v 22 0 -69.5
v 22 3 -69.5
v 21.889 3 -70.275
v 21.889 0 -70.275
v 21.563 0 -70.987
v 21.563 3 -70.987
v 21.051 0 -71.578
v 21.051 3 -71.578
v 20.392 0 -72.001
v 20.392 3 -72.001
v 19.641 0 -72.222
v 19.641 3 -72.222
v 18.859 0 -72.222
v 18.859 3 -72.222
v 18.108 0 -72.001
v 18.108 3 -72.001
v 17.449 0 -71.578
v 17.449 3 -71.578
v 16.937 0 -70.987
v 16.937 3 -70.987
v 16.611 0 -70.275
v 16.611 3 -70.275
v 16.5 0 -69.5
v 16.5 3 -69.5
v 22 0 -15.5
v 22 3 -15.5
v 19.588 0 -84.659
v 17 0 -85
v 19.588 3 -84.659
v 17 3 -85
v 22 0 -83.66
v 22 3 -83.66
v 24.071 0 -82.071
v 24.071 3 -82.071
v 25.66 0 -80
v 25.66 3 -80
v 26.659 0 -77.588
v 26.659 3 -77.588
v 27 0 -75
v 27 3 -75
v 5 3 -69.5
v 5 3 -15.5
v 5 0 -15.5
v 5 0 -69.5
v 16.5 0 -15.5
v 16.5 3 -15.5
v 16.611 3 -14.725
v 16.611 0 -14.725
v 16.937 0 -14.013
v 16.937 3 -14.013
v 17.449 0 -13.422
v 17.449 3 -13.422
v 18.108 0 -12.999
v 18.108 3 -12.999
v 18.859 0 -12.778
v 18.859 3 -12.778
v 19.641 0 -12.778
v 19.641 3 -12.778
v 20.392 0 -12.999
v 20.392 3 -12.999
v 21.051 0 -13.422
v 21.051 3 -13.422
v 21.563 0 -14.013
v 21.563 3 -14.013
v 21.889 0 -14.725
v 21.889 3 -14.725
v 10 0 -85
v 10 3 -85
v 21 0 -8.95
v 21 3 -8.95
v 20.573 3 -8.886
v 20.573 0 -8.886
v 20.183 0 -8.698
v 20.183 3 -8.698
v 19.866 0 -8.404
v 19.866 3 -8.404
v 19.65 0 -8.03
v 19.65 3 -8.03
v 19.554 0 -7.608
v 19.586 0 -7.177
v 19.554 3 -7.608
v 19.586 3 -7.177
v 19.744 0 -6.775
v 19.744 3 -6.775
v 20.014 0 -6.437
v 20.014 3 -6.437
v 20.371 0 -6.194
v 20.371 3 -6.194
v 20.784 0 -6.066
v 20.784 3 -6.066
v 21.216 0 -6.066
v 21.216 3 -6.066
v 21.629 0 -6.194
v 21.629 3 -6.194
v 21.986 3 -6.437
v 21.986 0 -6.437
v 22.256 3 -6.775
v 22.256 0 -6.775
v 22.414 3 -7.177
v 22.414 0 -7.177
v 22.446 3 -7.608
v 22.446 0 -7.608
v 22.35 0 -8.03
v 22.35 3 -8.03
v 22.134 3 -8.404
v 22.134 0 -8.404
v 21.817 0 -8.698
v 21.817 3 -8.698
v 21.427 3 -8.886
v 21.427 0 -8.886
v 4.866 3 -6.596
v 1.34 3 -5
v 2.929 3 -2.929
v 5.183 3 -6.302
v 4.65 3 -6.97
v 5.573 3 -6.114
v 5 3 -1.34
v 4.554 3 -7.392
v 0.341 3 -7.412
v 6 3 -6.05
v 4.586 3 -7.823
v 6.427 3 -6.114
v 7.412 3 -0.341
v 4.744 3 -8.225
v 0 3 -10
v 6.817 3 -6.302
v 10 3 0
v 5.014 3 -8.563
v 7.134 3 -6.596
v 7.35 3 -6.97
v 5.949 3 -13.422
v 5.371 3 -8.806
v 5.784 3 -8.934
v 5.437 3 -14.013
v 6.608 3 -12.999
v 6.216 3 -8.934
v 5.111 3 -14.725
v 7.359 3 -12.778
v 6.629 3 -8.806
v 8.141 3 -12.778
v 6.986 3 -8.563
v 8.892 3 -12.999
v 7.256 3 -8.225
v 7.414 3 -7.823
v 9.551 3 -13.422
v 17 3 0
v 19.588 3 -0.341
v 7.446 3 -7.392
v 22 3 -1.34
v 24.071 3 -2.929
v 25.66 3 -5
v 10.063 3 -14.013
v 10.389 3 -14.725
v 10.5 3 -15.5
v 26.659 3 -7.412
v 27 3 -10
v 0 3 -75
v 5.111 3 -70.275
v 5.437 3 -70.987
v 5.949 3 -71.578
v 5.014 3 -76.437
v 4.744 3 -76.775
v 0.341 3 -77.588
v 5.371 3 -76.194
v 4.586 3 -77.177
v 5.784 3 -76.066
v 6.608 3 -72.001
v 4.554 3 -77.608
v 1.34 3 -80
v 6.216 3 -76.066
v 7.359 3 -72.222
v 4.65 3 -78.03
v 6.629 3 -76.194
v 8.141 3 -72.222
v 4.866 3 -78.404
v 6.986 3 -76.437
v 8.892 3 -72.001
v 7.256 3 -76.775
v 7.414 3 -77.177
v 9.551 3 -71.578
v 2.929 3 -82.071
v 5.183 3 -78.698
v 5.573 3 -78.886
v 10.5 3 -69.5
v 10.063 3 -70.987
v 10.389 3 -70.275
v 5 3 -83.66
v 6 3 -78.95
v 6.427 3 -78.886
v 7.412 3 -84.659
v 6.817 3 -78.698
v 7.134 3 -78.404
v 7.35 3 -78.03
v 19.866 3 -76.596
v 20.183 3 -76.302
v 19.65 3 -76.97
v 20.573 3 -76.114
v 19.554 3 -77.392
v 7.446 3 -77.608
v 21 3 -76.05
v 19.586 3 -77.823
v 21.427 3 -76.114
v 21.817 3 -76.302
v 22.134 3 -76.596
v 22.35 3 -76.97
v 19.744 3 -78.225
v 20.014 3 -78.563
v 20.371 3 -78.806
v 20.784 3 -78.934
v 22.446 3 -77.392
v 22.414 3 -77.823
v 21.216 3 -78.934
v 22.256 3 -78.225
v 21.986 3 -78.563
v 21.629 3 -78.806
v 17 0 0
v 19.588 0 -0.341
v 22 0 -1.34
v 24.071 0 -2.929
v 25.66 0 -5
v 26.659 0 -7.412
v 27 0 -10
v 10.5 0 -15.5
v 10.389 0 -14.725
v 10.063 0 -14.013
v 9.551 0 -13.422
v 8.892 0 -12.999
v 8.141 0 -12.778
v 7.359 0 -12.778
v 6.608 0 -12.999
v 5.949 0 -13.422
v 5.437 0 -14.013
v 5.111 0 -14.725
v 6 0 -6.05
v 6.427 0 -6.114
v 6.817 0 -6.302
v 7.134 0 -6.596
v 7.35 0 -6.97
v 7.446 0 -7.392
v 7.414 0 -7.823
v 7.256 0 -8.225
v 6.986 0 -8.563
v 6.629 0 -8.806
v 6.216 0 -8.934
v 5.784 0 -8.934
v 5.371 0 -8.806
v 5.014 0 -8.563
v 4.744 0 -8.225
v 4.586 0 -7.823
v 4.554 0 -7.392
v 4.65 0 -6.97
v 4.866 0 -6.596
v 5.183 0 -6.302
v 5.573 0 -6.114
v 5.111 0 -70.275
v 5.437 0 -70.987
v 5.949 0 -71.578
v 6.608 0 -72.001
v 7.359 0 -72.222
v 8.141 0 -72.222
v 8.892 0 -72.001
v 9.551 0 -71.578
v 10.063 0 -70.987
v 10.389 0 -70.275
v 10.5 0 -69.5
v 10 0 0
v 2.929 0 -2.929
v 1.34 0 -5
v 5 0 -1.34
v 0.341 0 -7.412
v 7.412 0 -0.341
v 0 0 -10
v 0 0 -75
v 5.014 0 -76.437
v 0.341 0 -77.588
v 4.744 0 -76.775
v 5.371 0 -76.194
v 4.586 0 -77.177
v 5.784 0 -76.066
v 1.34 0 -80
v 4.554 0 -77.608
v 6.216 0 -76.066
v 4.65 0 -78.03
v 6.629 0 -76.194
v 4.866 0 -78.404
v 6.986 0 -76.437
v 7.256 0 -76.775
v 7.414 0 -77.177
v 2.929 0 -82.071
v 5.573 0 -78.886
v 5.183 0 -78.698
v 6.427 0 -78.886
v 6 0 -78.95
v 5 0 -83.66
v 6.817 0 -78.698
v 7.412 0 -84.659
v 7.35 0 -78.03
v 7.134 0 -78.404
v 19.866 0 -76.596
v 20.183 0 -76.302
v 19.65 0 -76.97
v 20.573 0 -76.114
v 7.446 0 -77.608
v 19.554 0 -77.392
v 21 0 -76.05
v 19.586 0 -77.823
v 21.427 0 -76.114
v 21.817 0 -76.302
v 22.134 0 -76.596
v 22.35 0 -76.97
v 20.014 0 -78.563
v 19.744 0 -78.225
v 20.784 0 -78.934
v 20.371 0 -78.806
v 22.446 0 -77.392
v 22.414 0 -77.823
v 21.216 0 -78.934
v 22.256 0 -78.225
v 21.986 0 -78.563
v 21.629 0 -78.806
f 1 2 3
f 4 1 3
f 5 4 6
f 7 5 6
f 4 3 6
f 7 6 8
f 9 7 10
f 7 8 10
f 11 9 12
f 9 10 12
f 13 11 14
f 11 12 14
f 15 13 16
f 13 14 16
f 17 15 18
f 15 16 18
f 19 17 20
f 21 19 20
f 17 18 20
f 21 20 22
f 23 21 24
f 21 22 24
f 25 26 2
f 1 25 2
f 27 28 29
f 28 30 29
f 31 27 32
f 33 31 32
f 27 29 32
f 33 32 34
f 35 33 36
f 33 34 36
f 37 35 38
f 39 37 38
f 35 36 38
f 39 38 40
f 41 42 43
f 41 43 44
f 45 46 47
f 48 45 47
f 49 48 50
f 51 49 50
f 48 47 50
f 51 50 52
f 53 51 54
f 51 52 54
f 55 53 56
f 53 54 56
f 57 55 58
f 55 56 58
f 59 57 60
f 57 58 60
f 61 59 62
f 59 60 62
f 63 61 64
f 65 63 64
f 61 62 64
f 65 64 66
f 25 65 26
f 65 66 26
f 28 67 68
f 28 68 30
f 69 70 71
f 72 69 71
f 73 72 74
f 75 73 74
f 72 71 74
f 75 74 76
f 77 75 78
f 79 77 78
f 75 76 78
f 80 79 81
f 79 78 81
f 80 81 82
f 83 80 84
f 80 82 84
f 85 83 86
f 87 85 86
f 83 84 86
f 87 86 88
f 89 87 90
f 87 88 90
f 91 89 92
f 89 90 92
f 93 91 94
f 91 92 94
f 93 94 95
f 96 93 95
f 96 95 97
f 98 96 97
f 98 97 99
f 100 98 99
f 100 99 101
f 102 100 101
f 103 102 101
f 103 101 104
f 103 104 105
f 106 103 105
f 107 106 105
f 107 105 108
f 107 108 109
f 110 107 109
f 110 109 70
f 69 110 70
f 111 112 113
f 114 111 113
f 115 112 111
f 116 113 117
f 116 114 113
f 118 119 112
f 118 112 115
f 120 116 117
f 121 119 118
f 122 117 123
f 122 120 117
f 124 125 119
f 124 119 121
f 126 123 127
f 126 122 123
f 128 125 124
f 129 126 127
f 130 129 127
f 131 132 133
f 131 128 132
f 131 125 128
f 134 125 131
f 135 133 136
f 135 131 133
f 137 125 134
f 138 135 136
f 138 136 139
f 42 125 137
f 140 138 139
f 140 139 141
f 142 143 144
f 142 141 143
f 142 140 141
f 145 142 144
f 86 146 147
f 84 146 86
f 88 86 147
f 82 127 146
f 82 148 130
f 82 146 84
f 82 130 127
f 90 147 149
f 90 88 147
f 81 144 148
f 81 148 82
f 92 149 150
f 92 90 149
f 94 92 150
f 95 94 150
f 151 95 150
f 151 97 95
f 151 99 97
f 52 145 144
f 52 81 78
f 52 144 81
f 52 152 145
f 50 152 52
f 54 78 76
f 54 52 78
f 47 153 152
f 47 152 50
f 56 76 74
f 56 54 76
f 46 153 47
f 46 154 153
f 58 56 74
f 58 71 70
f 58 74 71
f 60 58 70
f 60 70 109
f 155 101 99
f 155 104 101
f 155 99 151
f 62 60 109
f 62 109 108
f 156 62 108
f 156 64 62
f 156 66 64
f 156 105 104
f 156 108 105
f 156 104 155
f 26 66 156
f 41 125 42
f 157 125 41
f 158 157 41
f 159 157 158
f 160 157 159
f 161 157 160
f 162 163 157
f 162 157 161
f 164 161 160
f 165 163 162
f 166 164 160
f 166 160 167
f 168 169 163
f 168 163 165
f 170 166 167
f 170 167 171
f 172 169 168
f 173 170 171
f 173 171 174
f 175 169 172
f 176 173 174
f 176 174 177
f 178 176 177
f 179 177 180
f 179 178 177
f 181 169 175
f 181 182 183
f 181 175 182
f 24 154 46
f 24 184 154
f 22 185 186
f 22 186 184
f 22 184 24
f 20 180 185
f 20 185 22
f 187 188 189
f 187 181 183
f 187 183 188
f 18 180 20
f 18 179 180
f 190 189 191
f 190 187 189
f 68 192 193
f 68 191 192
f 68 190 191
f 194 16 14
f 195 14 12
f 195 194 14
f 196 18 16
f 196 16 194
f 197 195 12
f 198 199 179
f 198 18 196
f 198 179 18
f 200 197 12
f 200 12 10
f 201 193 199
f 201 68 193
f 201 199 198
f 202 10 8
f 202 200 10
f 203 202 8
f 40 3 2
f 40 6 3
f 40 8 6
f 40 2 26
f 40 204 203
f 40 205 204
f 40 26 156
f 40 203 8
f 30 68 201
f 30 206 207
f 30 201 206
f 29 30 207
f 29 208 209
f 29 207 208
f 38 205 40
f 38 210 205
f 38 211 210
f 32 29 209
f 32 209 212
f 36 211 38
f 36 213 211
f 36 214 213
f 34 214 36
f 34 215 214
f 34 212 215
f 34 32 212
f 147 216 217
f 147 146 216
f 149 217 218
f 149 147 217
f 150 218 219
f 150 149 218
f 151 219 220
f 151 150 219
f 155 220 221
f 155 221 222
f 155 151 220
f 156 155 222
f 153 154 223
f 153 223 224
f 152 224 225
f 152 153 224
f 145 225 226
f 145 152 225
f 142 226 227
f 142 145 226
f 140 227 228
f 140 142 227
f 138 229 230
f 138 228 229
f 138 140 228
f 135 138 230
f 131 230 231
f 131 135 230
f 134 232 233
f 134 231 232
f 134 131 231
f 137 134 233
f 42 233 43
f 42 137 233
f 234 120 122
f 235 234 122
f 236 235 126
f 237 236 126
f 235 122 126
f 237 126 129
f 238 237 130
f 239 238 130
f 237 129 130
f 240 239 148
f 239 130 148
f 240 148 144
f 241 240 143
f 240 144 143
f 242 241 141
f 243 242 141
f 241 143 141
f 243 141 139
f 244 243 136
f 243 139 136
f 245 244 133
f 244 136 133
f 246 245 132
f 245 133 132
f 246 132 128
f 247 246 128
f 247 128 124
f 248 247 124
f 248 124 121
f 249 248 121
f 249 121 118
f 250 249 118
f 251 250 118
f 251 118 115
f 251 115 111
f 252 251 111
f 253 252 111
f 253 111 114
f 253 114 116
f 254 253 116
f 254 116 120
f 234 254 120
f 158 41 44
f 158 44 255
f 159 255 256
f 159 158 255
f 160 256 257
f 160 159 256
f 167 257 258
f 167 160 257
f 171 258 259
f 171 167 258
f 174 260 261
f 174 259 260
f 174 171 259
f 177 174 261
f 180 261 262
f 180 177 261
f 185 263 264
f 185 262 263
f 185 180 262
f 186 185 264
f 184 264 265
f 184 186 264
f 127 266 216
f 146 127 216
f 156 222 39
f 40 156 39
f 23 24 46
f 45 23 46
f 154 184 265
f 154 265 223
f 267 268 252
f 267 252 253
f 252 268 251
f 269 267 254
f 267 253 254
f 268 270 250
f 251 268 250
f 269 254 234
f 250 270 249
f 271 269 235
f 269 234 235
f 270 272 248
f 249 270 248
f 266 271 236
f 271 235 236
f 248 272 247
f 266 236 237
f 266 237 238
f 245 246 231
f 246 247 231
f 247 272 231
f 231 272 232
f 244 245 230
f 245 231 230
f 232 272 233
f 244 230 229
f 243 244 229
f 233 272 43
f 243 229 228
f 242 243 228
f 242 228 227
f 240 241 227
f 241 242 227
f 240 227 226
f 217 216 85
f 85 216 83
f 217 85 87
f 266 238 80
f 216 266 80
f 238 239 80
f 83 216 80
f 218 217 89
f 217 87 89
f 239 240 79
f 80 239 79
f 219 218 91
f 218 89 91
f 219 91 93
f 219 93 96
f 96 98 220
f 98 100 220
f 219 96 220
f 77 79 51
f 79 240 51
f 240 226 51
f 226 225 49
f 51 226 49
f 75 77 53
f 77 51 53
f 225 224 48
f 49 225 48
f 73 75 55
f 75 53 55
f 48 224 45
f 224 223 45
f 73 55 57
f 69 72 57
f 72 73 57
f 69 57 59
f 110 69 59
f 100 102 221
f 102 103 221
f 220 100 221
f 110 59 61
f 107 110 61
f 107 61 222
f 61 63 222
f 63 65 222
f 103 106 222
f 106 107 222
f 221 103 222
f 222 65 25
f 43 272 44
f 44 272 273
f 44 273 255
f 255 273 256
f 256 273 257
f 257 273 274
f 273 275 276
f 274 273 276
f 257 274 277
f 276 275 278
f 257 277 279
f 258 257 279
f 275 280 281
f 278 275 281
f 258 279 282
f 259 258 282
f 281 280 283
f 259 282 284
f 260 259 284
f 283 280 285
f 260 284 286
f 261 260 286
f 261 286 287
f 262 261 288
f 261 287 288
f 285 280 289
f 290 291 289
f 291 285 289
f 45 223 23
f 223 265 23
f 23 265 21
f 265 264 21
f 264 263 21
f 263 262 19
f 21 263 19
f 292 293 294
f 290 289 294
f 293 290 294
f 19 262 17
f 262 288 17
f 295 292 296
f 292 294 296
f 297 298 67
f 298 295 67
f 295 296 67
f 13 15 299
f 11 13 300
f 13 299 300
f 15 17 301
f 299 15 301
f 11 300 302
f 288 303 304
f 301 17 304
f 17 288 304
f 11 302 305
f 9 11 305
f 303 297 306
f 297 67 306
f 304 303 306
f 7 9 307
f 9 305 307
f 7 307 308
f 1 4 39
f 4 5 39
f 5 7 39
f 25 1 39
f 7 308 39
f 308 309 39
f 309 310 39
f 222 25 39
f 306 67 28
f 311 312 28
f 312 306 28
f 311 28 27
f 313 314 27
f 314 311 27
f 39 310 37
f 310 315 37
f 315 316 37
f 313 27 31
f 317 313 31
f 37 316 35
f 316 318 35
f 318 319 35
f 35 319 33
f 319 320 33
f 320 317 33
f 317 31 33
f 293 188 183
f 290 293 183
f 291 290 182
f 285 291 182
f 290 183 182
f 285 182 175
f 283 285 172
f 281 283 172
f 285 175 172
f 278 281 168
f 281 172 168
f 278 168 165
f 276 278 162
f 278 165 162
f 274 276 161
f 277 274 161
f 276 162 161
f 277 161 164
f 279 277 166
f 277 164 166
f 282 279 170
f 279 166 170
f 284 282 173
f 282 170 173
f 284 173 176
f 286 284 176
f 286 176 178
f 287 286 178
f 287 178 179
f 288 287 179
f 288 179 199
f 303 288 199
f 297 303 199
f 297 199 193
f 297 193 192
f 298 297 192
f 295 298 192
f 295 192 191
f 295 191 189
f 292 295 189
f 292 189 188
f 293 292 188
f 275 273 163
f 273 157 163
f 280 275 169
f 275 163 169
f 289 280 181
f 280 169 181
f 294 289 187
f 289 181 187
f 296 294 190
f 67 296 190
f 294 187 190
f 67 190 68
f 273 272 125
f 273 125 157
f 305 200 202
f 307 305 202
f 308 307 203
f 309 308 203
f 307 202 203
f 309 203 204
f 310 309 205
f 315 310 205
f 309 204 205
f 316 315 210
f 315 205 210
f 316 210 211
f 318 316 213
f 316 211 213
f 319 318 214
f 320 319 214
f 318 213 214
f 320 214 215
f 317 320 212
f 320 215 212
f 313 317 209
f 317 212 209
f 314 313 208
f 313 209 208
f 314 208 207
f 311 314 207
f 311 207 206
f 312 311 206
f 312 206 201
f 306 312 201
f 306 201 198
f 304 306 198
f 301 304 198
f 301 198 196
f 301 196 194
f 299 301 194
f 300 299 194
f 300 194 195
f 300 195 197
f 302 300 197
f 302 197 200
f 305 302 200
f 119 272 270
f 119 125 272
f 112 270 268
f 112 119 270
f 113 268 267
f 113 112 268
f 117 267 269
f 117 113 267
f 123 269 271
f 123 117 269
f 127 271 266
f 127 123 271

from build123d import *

# Parameters (mm, degrees)
SKETCH_1_W          = 27
SKETCH_1_H          = 85
EXTRUDE_1_DEPTH     = 3
SKETCH_2_R          = 1.45
CUT_EXTRUDE_1_DEPTH = 90.235643103
CUT_EXTRUDE_2_DEPTH = 90.235643103
FILLET_1_R          = 10


with BuildPart() as part:
    # 草图1 → 凸台-拉伸1 (new body)
    with BuildSketch(Plane(origin=(0, 0, 0), x_dir=(1, 0, 0), z_dir=(0, 1, 0))):
        with Locations((13.5, 42.5)):
            Rectangle(SKETCH_1_W, SKETCH_1_H)
    extrude(amount=EXTRUDE_1_DEPTH)

    # 草图2 → 切除-拉伸1 (cut, through all)
    with BuildSketch(Plane(origin=(0, 3, 0), x_dir=(1, 0, 0), z_dir=(0, 1, 0))):
        with Locations(Location((6, 7.5, 0), (0, 0, 270))):
            Circle(SKETCH_2_R)
        with Locations(Location((21, 7.5, 0), (0, 0, 90))):
            Circle(SKETCH_2_R)
        with Locations(Location((21, 77.5, 0), (0, 0, 270))):
            Circle(SKETCH_2_R)
        with Locations(Location((6, 77.5, 0), (0, 0, 90))):
            Circle(SKETCH_2_R)
    extrude(amount=-CUT_EXTRUDE_1_DEPTH, mode=Mode.SUBTRACT)

    # 草图3 → 切除-拉伸2 (cut, through all)
    with BuildSketch(Plane(origin=(0, 3, 0), x_dir=(1, 0, 0), z_dir=(0, 1, 0))):
        with BuildLine():
            Line((10.5, 69.5), (10.5, 15.5))
            ThreePointArc((10.5, 15.5), (7.75, 12.75), (5, 15.5))
            Line((5, 15.5), (5, 69.5))
            ThreePointArc((5, 69.5), (7.75, 72.25), (10.5, 69.5))
        make_face()
        with BuildLine():
            Line((16.5, 69.5), (16.5, 15.5))
            ThreePointArc((16.5, 15.5), (19.25, 12.75), (22, 15.5))
            Line((22, 15.5), (22, 69.5))
            ThreePointArc((22, 69.5), (19.25, 72.25), (16.5, 69.5))
        make_face()
    extrude(amount=-CUT_EXTRUDE_2_DEPTH, mode=Mode.SUBTRACT)

    # 圆角1
    fillet_1_edges = [part.edges().sort_by_distance(p)[0] for p in [
        (0, 1.5, -85),
        (27, 1.5, -85),
        (27, 1.5, 0),
        (0, 1.5, 0),
    ]]
    fillet(fillet_1_edges, radius=FILLET_1_R)


solid = part.part
